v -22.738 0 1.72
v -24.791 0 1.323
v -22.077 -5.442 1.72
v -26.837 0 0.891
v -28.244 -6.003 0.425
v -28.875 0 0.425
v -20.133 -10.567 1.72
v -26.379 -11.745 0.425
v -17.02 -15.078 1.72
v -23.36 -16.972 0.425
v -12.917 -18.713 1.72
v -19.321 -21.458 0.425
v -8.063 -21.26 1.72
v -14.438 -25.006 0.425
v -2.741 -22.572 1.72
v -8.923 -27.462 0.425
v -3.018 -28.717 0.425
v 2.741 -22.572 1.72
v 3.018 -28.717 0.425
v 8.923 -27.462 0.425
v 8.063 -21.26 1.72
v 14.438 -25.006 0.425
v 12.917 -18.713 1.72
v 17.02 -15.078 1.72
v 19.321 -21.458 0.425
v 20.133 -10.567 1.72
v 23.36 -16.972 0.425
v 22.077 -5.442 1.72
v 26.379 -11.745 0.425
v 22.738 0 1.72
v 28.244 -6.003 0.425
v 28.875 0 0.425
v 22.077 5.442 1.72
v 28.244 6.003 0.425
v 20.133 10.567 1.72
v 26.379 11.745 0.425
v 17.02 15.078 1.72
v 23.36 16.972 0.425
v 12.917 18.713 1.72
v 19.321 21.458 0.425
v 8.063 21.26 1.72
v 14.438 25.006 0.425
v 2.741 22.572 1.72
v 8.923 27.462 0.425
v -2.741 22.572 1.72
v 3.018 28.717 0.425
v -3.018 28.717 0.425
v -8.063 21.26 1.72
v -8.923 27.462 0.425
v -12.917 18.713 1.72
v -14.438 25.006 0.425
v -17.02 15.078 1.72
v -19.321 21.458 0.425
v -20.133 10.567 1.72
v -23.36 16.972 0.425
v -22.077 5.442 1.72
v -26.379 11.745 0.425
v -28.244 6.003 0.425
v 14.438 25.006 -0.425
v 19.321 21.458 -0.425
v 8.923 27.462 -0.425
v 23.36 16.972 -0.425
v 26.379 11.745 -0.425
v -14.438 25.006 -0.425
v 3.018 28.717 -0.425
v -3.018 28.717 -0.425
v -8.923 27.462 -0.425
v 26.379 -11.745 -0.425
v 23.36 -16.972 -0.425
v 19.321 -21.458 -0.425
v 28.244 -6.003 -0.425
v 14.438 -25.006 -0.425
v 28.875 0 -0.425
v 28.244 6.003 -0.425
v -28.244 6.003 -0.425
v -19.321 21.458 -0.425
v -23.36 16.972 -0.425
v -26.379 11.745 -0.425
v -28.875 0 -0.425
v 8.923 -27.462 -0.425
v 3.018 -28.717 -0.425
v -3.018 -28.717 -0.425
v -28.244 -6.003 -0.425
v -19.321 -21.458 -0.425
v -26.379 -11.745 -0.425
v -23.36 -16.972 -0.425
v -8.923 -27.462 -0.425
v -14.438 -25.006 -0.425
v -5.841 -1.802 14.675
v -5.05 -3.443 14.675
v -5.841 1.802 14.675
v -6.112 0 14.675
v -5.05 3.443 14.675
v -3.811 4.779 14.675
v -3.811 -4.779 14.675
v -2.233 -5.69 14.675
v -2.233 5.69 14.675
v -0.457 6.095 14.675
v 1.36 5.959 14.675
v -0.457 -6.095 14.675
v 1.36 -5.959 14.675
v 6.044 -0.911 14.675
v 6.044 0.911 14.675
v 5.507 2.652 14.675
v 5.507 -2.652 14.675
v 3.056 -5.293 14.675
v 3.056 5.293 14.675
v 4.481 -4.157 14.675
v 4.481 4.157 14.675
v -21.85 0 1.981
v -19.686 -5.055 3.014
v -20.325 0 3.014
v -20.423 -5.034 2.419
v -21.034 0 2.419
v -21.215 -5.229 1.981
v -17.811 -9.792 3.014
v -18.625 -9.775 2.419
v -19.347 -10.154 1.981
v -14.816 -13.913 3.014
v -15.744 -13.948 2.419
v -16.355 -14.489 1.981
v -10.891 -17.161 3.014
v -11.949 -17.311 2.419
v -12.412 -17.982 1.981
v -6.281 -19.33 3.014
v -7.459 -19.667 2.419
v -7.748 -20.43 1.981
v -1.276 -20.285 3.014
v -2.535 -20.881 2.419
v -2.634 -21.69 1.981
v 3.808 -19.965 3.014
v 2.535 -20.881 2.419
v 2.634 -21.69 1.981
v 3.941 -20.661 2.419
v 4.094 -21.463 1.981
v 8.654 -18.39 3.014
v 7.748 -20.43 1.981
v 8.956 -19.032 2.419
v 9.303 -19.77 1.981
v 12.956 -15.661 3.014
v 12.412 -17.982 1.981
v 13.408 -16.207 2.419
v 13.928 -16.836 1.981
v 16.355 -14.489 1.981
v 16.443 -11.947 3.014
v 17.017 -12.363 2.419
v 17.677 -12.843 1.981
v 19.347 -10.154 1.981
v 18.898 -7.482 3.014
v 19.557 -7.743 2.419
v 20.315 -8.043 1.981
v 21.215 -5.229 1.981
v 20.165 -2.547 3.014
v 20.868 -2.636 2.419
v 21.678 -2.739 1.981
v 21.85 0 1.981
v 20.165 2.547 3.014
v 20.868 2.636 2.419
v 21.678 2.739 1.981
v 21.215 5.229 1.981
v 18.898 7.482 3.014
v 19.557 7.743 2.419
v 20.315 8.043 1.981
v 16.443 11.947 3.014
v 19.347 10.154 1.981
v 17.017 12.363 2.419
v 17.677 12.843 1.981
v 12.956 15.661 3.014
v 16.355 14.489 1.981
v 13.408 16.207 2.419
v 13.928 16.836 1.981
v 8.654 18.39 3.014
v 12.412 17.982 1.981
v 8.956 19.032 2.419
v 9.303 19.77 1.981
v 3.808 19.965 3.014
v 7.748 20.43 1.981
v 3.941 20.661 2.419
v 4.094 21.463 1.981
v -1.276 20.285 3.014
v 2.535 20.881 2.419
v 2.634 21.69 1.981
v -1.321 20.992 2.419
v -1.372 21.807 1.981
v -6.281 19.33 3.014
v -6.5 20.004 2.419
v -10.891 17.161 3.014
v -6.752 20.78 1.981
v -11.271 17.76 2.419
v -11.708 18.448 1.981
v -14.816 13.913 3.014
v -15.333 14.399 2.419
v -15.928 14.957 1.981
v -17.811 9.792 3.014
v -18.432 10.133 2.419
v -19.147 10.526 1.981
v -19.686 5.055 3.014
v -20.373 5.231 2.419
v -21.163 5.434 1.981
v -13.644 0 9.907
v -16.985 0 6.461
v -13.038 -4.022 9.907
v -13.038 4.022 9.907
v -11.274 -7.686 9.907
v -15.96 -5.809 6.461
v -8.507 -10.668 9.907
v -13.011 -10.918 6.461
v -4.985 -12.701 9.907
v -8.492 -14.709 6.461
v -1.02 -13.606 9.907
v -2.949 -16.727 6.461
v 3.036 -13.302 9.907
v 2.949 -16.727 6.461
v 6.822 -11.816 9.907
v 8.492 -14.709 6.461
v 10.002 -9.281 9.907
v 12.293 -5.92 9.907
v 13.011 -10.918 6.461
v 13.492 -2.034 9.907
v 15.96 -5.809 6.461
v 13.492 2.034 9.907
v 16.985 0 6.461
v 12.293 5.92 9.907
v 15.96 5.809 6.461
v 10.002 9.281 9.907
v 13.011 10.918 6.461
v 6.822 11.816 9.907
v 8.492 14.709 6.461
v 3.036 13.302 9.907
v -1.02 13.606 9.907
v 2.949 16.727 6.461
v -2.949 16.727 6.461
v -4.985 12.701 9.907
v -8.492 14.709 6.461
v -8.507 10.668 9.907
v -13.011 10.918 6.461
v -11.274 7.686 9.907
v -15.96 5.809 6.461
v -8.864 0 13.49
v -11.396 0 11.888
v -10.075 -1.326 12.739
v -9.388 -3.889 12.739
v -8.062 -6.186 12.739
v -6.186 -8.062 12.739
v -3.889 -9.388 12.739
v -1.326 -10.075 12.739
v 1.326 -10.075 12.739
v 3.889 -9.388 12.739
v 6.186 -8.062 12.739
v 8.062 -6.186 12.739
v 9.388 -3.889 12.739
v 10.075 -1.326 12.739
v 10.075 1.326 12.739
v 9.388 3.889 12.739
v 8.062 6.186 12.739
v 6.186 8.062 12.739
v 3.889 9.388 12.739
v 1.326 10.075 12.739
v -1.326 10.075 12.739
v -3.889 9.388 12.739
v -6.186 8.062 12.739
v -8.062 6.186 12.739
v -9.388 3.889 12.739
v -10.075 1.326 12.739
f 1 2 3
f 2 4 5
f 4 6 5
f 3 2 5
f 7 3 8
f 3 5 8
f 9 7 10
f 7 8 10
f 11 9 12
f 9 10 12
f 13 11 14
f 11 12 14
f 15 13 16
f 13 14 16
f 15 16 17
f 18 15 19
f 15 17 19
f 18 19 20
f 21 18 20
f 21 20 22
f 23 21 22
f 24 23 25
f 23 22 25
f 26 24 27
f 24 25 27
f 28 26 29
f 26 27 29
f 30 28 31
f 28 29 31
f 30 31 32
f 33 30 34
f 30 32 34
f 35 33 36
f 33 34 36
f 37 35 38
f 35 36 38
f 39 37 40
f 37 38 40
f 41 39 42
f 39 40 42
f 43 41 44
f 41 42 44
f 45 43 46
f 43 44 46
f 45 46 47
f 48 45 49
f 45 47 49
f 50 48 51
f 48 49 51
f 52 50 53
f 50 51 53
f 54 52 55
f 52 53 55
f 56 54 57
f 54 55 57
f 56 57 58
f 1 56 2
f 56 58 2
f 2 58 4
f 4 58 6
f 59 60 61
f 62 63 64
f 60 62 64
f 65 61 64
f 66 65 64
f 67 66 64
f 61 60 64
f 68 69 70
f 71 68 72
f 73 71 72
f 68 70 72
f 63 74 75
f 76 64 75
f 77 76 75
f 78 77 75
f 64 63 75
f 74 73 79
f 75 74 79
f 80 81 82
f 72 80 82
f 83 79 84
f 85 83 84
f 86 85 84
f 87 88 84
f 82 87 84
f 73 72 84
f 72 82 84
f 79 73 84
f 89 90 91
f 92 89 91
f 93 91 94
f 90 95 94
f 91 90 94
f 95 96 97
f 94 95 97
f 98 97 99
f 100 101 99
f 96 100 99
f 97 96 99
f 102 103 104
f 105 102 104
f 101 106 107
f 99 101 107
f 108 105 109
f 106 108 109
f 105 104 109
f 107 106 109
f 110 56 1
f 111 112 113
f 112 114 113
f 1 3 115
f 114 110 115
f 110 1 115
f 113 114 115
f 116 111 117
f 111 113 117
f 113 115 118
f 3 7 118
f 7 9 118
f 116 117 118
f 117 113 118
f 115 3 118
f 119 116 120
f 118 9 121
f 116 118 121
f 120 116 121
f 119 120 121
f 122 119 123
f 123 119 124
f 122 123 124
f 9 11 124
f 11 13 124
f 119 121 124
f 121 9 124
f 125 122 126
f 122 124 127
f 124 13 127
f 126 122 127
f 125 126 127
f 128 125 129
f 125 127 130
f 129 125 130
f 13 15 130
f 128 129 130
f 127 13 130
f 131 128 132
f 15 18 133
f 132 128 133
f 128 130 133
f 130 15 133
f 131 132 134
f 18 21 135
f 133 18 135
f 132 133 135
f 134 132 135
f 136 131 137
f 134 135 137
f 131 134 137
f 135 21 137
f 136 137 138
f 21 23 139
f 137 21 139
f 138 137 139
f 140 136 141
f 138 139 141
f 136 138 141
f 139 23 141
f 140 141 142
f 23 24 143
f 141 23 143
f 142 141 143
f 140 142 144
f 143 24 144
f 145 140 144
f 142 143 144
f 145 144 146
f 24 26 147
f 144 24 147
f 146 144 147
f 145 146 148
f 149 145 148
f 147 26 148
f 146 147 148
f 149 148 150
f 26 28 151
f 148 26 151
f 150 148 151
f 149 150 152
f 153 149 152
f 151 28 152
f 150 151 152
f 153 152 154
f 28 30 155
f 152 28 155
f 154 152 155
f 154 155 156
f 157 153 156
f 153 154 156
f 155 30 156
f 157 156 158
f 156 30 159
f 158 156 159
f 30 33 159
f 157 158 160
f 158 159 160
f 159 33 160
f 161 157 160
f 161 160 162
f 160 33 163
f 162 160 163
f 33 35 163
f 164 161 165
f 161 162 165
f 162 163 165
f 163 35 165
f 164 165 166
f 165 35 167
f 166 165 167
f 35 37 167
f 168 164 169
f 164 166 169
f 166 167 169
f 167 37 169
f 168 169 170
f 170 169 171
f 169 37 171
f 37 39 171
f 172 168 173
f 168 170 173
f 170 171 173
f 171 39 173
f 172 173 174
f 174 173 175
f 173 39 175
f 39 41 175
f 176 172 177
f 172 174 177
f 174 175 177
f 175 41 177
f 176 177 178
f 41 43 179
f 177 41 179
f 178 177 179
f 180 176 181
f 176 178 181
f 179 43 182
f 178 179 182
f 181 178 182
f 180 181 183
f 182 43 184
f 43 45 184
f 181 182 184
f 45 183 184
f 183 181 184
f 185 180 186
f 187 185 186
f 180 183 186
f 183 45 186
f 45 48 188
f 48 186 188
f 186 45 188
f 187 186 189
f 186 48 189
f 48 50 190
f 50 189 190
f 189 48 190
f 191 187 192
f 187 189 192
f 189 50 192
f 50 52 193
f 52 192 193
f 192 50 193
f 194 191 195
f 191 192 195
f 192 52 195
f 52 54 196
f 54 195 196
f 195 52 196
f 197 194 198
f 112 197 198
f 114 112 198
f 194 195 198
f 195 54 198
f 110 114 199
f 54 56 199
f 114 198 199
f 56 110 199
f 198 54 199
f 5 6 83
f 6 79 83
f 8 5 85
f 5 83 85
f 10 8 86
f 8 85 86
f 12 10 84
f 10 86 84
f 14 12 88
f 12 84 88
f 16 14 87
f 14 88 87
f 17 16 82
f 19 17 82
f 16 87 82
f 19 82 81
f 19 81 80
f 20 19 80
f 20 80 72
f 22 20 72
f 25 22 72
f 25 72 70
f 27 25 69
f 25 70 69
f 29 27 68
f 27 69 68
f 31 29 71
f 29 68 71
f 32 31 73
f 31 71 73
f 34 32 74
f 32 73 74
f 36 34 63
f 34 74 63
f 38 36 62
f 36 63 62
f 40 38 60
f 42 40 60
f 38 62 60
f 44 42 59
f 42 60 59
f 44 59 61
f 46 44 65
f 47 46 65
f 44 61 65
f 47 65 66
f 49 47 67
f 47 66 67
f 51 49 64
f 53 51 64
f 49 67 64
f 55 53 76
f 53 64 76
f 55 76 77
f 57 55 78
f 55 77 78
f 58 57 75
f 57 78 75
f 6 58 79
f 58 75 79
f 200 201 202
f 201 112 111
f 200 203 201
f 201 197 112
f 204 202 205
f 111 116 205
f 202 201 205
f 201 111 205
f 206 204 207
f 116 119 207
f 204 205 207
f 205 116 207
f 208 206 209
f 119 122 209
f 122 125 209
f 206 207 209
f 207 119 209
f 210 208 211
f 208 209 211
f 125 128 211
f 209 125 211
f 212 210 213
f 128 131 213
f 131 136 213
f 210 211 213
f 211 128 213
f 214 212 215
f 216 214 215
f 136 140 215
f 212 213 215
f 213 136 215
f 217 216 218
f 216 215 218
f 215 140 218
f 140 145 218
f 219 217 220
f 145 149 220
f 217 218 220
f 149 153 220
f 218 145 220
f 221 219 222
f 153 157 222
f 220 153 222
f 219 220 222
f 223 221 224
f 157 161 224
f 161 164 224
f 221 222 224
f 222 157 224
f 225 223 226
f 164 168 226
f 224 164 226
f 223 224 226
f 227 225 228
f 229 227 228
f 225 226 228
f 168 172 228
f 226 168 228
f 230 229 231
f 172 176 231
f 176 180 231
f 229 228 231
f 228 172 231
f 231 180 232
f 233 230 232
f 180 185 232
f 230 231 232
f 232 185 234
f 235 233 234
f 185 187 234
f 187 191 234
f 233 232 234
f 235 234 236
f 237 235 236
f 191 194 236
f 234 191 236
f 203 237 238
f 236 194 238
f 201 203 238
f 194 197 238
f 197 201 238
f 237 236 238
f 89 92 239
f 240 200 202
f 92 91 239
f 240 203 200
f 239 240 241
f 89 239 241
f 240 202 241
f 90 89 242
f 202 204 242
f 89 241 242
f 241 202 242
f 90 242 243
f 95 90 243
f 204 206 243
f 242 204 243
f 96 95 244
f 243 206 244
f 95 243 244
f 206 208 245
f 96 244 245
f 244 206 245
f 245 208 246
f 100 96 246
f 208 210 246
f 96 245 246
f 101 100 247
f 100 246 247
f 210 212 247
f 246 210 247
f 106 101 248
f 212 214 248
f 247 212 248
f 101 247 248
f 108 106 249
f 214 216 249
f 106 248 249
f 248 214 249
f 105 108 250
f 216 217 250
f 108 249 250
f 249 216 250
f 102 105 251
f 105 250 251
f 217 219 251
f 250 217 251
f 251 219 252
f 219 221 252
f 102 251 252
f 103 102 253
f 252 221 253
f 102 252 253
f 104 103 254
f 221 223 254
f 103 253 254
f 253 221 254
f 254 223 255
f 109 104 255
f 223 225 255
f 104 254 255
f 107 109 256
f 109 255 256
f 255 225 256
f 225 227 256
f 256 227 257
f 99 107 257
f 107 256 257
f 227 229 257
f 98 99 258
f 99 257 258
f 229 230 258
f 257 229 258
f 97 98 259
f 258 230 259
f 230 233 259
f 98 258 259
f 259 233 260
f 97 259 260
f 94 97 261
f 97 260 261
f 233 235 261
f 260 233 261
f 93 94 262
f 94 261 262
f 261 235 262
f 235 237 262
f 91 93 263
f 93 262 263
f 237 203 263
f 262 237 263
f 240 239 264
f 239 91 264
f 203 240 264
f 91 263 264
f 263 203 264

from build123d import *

# Parameters (mm, degrees)
F3_DEPTH = 12.5


with BuildPart() as f1:
    # F0 (on Front) → F1 (revolve)
    with BuildSketch(Plane.XZ):
        with BuildLine():
            ThreePointArc((-18.0916087155, 2.4896269549), (-9.0697101385, 3.4763084496), (0, 3.8057812268))
            Line((0, 3.8057812268), (0, 15.685))
            ThreePointArc((0, 15.685), (-7.408626068, 14.1810641227), (-13.6443996575, 9.9073431353))
            ThreePointArc((-13.6443996575, 9.9073431353), (-16.295679955, 6.4548932852), (-18.0916087155, 2.4896269549))
        make_face()
        with BuildLine():
            ThreePointArc((-21.3346085291, 1.9716631865), (-19.7148097422, 2.2412958765), (-18.0916087155, 2.4896269549))
            ThreePointArc((-18.0916087155, 2.4896269549), (-16.295679955, 6.4548932852), (-13.6443996575, 9.9073431353))
            Line((-13.6443996575, 9.9073431353), (-20.3248404986, 3.0136629614))
            Line((-20.3248404986, 3.0136629614), (-21.3346085291, 1.9716631865))
        make_face()
        with BuildLine():
            ThreePointArc((-22.7378459416, 1.7203465229), (-25.8145491381, 1.1111738013), (-28.875, 0.425))
            Line((-28.875, 0.425), (-18.6282688407, 0.425))
            ThreePointArc((-18.6282688407, 0.425), (-18.3889375183, 1.464851143), (-18.0916087155, 2.4896269549))
            ThreePointArc((-18.0916087155, 2.4896269549), (-19.7148097422, 2.2412958765), (-21.3346085291, 1.9716631865))
            ThreePointArc((-21.3346085291, 1.9716631865), (-22.0365855065, 1.848005277), (-22.7378459416, 1.7203465229))
        make_face()
        Polygon((-28.875, -0.425), (0, -0.425), (0, 0), (0, 0.425), (-18.6282688407, 0.425), (-28.875, 0.425), align=None)
        with BuildLine():
            ThreePointArc((-20.3248404986, 3.0136629614), (-21.4306013049, 2.1790454907), (-22.7378459416, 1.7203465229))
            ThreePointArc((-22.7378459416, 1.7203465229), (-22.0365855065, 1.848005277), (-21.3346085291, 1.9716631865))
            Line((-21.3346085291, 1.9716631865), (-20.3248404986, 3.0136629614))
        make_face()
        with BuildLine():
            Line((-18.6282688407, 0.425), (0, 0.425))
            Line((0, 0.425), (0, 3.8057812268))
            ThreePointArc((0, 3.8057812268), (-9.0697101385, 3.4763084496), (-18.0916087155, 2.4896269549))
            ThreePointArc((-18.0916087155, 2.4896269549), (-18.3889375183, 1.464851143), (-18.6282688407, 0.425))
        make_face()
    revolve(axis=Axis((0, 0, 10.397832983), (0, 0, 1)))

    # F2 (on Right) → F3 (cut, symmetric)
    with BuildSketch(Plane.YZ):
        Polygon((-34.8162702815, 14.675), (27.6827993542, 14.675), (-3.9353072157, 26.7957725373), (-36.1574023472, 14.675), align=None)
    extrude(amount=F3_DEPTH, both=True, mode=Mode.SUBTRACT)


solid = f1.part
